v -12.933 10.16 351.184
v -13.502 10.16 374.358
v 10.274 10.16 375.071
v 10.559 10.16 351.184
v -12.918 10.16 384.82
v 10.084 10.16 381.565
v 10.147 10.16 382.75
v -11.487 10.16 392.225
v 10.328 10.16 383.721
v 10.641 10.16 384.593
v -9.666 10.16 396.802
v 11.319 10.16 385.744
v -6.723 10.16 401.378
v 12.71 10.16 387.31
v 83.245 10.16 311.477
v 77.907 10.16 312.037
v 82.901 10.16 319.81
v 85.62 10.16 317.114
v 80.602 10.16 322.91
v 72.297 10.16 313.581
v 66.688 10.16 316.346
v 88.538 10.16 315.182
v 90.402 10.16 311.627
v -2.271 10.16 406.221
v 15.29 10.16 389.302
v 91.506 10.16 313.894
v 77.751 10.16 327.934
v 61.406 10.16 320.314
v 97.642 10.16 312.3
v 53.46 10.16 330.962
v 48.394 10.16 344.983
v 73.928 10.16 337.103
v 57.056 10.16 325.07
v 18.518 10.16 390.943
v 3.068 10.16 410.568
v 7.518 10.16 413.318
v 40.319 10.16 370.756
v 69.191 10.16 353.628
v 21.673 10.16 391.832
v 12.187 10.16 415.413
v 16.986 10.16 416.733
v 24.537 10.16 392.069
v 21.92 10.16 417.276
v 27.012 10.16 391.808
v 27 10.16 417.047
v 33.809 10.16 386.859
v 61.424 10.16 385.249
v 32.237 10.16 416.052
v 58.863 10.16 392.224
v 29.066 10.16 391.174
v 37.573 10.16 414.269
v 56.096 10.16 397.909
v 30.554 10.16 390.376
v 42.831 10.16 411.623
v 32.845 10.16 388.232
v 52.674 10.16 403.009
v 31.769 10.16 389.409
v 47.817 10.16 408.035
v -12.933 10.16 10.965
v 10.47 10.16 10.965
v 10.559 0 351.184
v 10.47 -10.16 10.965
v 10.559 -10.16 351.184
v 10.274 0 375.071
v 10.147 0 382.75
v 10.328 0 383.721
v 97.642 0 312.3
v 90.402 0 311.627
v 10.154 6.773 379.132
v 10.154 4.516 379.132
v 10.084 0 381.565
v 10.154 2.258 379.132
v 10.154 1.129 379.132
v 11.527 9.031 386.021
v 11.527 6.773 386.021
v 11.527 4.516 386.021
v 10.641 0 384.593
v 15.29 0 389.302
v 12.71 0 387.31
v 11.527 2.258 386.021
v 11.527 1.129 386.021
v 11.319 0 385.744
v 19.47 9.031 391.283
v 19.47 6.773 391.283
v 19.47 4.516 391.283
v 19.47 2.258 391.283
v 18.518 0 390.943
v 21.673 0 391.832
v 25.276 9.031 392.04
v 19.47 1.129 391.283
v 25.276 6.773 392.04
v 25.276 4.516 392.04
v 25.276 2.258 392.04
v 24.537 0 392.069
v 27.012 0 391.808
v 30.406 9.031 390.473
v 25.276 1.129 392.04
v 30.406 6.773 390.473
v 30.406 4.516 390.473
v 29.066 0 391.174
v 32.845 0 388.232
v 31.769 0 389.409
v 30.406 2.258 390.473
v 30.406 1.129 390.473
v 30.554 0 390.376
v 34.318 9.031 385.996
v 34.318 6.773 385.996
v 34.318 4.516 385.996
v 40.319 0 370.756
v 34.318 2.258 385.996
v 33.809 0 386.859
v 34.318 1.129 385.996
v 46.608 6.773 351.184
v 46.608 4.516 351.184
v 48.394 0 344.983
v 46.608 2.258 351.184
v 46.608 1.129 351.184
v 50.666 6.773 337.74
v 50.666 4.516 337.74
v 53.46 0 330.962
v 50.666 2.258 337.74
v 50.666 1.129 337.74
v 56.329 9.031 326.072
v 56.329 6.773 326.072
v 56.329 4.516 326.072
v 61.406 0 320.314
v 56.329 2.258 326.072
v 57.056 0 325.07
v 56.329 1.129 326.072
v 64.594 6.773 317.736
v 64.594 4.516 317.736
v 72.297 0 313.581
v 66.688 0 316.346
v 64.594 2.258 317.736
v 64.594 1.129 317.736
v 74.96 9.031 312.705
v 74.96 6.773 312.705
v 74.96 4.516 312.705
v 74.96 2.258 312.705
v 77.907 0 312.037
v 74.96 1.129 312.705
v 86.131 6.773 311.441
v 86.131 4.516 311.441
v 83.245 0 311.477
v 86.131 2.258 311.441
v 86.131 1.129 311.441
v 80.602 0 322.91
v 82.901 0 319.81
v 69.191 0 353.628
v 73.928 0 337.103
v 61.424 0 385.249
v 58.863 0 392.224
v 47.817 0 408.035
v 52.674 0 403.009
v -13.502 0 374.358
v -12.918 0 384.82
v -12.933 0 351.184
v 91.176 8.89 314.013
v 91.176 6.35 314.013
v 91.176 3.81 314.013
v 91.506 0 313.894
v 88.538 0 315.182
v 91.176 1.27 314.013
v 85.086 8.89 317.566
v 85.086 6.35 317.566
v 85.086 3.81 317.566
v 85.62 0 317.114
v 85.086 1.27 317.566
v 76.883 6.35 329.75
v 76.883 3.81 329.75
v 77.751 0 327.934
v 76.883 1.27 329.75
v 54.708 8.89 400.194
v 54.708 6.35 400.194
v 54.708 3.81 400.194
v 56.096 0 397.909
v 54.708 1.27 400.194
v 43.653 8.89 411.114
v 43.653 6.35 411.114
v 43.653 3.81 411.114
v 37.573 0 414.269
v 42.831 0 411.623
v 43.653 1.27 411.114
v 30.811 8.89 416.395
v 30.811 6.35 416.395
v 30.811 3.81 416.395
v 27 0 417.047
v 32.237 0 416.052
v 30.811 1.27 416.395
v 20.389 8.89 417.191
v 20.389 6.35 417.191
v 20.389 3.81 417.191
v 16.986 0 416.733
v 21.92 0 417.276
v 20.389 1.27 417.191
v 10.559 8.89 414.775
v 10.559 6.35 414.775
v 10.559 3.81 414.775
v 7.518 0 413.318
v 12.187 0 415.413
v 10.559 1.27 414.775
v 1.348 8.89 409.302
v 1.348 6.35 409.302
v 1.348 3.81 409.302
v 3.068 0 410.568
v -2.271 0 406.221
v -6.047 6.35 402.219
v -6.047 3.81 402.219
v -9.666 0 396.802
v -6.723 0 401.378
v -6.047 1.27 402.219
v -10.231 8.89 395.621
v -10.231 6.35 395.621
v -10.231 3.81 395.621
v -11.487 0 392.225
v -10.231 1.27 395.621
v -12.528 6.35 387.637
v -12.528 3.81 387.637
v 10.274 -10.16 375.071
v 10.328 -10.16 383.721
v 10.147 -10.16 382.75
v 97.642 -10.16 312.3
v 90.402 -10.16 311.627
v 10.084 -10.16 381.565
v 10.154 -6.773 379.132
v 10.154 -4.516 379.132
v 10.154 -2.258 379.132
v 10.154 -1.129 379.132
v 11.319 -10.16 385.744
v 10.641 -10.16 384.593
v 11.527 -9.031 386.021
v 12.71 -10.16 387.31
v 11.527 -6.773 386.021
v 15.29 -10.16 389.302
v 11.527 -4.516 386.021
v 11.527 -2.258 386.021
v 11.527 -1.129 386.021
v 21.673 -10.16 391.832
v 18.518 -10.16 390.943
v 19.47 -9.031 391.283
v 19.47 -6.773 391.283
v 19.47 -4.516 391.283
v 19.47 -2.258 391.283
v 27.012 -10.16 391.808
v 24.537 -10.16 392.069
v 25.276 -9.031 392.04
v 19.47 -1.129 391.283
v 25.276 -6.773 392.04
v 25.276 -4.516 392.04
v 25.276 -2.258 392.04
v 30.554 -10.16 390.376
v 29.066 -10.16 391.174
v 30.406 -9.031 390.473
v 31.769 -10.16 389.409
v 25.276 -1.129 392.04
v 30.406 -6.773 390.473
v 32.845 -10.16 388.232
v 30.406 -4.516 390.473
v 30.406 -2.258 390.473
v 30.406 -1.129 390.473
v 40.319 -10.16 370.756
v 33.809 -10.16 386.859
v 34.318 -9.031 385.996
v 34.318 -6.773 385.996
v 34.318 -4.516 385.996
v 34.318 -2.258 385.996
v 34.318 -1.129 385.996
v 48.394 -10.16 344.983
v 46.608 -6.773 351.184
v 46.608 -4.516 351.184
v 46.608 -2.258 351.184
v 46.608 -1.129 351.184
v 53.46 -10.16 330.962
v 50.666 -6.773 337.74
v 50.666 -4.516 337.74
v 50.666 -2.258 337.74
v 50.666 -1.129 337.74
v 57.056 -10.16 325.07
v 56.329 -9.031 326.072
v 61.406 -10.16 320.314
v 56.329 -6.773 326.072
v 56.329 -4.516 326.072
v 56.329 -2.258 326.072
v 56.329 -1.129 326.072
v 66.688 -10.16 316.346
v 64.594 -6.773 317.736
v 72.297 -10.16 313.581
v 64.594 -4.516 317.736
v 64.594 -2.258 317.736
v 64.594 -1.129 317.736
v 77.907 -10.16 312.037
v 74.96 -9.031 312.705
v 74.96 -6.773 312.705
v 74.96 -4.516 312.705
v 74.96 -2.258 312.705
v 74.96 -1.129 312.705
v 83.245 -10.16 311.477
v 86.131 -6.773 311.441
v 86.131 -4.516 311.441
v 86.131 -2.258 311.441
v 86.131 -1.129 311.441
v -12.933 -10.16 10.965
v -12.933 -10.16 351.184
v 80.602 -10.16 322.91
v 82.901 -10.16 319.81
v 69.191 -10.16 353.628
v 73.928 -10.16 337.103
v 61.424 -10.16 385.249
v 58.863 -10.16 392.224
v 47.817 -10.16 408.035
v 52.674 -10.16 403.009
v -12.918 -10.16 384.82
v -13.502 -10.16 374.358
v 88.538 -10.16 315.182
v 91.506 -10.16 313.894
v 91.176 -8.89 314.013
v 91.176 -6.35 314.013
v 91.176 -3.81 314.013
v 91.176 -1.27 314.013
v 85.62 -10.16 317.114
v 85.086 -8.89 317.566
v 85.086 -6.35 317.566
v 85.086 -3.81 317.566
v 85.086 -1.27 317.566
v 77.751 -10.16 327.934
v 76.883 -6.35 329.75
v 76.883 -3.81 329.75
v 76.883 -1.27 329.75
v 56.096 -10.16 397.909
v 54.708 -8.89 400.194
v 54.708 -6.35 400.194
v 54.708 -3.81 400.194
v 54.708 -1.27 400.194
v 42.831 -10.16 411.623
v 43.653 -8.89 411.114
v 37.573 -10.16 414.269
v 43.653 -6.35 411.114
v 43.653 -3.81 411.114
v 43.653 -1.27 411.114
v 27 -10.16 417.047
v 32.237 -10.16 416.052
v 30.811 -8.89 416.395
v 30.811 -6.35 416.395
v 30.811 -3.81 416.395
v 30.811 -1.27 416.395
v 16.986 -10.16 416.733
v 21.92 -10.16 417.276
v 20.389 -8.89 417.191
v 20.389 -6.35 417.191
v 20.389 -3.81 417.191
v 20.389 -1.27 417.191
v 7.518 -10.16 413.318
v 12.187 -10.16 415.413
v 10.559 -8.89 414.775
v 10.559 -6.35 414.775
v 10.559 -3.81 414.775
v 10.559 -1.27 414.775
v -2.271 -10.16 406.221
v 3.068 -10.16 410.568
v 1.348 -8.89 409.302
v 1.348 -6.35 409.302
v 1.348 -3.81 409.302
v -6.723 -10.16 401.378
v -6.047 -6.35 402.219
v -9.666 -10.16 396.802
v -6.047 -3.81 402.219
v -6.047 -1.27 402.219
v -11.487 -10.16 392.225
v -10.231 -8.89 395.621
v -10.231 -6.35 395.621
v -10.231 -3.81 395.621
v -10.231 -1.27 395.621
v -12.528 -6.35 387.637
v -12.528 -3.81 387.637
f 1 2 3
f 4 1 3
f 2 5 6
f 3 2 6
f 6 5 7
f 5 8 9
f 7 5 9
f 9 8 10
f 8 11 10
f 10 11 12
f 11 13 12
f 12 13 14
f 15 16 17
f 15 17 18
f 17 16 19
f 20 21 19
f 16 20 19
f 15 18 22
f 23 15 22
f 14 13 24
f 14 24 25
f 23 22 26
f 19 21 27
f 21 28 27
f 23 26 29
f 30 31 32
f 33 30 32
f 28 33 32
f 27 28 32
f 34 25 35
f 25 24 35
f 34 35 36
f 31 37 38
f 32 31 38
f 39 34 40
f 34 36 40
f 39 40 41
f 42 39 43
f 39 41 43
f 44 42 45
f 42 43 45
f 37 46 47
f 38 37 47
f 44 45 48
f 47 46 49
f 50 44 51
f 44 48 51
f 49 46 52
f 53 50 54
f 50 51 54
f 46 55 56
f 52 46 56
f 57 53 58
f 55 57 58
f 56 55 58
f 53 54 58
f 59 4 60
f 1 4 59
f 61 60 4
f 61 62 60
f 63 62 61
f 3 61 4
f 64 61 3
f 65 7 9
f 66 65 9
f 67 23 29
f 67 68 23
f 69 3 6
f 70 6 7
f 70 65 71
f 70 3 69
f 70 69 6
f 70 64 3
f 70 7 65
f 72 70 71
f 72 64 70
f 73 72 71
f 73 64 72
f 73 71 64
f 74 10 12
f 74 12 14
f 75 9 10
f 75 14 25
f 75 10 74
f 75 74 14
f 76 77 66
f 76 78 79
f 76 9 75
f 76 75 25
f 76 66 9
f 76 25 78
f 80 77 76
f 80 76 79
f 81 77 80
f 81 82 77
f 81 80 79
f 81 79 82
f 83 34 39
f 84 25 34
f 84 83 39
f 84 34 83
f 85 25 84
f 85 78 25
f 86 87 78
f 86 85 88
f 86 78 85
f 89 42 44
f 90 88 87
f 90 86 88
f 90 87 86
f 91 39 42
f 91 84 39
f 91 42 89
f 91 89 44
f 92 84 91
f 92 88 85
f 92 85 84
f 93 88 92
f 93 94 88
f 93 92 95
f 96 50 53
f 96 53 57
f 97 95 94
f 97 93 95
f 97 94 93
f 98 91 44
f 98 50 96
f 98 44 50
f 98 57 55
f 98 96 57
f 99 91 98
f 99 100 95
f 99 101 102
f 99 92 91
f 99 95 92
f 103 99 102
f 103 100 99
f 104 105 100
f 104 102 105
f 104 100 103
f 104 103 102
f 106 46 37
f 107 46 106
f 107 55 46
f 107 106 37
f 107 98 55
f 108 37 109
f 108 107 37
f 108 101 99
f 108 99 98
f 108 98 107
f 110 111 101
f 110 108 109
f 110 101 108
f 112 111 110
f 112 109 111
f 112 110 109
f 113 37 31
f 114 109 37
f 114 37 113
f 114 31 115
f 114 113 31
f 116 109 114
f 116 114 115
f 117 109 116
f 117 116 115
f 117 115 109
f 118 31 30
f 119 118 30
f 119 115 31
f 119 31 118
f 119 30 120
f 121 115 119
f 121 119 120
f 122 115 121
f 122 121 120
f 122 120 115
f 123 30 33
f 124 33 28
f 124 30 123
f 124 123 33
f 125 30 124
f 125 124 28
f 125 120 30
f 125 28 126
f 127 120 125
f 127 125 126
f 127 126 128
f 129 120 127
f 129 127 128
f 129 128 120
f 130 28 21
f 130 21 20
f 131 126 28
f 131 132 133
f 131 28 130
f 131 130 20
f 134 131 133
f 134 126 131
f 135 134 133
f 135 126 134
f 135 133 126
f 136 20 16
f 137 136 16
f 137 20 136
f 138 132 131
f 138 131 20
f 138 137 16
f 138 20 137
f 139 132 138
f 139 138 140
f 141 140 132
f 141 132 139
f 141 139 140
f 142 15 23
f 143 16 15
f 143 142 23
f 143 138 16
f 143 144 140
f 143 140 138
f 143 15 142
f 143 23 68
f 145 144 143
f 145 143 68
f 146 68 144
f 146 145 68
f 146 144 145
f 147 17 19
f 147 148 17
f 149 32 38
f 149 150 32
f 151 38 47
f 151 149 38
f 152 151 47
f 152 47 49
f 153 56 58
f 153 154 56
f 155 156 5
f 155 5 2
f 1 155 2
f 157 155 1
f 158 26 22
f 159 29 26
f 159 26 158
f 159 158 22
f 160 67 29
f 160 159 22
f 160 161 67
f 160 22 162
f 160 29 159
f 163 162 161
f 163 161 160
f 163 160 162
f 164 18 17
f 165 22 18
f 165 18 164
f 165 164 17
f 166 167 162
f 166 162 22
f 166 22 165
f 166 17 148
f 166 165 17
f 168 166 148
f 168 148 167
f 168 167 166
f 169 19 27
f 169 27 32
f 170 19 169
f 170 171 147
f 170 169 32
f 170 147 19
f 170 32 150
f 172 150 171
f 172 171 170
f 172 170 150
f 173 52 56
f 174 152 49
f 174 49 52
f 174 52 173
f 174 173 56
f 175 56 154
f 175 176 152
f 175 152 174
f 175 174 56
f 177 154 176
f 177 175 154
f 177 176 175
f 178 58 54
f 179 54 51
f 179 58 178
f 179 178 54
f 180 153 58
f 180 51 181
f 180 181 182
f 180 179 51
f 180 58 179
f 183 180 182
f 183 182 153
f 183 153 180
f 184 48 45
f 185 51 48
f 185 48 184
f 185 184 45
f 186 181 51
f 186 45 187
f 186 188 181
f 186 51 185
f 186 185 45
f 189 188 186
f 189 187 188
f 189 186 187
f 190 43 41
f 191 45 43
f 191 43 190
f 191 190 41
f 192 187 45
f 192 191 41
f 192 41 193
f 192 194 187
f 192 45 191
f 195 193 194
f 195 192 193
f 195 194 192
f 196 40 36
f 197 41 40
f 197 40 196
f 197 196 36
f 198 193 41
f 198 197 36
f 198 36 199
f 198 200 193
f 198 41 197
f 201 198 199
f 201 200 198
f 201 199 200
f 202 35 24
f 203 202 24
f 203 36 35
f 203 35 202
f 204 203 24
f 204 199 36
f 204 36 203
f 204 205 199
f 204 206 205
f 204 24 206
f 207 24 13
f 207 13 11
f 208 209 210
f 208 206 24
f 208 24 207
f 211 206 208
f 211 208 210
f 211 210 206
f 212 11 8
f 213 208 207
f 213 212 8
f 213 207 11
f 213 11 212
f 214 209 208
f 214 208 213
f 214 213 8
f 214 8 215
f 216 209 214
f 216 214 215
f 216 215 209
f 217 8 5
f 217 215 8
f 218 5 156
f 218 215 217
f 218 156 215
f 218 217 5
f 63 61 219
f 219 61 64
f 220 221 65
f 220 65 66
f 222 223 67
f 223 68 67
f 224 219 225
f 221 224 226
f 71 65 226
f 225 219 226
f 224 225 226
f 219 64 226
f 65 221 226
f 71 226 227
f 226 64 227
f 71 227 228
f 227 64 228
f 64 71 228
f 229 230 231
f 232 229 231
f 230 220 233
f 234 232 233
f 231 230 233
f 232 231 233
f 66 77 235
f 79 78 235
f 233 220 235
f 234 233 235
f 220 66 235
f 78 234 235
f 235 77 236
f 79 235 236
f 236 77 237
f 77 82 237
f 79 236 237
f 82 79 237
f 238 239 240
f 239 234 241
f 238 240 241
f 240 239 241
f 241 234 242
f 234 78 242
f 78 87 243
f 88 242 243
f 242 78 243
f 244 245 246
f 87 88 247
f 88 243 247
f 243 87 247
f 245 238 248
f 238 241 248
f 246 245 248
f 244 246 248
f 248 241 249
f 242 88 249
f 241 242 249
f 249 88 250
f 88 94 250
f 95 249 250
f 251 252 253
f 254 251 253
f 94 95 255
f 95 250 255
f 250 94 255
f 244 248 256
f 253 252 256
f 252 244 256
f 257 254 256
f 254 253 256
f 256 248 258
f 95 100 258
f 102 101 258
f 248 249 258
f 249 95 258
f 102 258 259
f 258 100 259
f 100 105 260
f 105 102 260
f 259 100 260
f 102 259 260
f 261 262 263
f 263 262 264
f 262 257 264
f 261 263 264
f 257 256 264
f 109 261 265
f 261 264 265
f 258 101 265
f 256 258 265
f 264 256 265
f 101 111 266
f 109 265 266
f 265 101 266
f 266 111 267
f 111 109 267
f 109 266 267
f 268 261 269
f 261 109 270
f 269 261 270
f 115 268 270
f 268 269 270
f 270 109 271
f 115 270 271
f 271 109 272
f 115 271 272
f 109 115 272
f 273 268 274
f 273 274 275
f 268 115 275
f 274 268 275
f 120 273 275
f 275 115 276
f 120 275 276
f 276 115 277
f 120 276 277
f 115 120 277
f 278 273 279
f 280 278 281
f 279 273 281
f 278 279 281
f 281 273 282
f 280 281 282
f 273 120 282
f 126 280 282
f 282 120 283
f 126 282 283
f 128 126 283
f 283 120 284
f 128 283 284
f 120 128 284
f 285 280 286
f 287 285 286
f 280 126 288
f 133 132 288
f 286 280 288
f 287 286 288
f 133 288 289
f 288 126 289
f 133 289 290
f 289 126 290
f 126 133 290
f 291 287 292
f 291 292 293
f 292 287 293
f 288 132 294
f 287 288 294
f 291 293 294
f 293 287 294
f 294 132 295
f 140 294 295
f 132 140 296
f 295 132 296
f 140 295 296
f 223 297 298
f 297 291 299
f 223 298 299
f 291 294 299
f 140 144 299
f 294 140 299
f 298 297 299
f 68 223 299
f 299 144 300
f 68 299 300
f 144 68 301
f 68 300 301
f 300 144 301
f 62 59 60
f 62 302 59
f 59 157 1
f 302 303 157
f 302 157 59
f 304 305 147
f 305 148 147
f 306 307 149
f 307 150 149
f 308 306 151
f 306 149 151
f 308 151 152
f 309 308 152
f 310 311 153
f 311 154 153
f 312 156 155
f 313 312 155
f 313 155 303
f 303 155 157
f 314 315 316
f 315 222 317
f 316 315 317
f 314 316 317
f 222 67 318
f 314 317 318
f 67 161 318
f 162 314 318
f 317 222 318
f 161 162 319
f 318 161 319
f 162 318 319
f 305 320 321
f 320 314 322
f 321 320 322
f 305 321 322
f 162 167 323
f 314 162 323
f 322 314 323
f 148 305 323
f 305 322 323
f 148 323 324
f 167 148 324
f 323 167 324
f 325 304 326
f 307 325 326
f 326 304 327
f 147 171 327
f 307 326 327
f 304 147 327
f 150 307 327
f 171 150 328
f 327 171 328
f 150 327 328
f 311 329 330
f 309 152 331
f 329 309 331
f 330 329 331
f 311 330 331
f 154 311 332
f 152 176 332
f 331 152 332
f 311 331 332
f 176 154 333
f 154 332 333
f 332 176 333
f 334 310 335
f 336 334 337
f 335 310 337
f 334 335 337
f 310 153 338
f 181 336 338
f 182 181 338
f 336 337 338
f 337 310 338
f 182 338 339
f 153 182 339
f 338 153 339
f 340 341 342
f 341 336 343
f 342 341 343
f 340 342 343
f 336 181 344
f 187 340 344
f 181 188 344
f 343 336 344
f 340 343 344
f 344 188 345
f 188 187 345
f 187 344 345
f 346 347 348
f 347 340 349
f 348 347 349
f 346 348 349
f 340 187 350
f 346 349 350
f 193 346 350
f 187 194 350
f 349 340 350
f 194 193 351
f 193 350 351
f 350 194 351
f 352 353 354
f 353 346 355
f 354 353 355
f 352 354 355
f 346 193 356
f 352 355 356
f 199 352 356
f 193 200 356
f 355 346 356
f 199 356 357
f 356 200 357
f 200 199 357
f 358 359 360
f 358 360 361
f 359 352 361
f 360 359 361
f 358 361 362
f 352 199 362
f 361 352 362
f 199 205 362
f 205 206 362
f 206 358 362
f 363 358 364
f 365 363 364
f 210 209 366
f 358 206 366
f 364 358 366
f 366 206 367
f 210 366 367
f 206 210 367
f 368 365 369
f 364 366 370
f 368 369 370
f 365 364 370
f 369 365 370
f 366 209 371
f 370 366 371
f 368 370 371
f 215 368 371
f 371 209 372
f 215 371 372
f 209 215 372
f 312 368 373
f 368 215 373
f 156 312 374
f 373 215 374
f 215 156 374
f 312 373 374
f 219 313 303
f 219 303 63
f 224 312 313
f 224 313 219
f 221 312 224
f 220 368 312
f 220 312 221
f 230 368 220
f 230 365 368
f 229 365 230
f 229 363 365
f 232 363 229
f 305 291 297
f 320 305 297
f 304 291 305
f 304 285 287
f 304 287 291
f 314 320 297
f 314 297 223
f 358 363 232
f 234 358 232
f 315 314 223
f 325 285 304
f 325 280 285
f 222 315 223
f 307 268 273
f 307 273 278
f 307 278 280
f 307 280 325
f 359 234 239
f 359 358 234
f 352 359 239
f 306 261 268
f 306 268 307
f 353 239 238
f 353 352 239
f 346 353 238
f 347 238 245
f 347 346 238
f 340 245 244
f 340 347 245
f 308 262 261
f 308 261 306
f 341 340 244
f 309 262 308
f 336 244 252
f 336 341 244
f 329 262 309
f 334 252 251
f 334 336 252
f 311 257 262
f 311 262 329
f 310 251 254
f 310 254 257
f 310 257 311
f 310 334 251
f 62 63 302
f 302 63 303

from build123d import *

# Parameters (mm, degrees)
F1_DEPTH = 10.16
F2_DEPTH = 10.16


with BuildPart() as f1:
    # F0 (on Front) → F1 (new body)
    with BuildSketch(Plane.XZ):
        with BuildLine():
            add(Edge.make_bspline(
                [(10.5592533946, 351.1839807034), (10.4695804772, 362.2397616149), (10.3379149951, 378.4728090705), (9.7360376148, 385.5270541931), (19.2131343725, 392.7085587466), (32.0804052727, 392.1229848008), (37.8562186443, 378.3041881788), (47.1232515746, 351.0337093949), (53.4121597084, 324.9371769494), (74.4654499748, 309.8701281314), (89.9305831262, 311.4917079437), (97.6424217224, 312.30032444)],
                knots=[0, 0, 0, 0, 0.1386962725, 0.2036457841, 0.2884633477, 0.3753380517, 0.4708961009, 0.613286711, 0.7494226975, 0.8750471985, 1, 1, 1, 1], degree=3))
            add(Edge.make_bspline(
                [(97.6424217224, 312.30032444), (93.2895767735, 313.2374462492), (82.0519688116, 315.6567852397), (68.0655444832, 348.9434690674), (61.1459988736, 402.9074772139), (31.6413052957, 418.6019174353), (10.146283367, 416.9449132033), (-7.369202363, 402.7523547121), (-14.4361515415, 387.3992123411), (-13.4977264475, 364.7906029996), (-12.9329506308, 351.1839807034)],
                knots=[0, 0, 0, 0, 0.089206328, 0.2303012751, 0.4082805925, 0.5381818337, 0.6471509846, 0.757459556, 0.8540309949, 1, 1, 1, 1], degree=3))
            Line((-12.9329506308, 351.1839807034), (-12.9329506308, 10.9654702246))
            Line((-12.9329506308, 10.9654702246), (10.4695804772, 10.9654702246))
            Line((10.4695804772, 10.9654702246), (10.5592533946, 351.1839807034))
        make_face()
    extrude(amount=F1_DEPTH)

    # F2 (add): a face of the model
    f2_faces = [f1.faces().sort_by_distance(p)[0] for p in [
        (-8.7203777057, 0, 181.074725464),
    ]]
    extrude(f2_faces, amount=F2_DEPTH)


solid = f1.part
